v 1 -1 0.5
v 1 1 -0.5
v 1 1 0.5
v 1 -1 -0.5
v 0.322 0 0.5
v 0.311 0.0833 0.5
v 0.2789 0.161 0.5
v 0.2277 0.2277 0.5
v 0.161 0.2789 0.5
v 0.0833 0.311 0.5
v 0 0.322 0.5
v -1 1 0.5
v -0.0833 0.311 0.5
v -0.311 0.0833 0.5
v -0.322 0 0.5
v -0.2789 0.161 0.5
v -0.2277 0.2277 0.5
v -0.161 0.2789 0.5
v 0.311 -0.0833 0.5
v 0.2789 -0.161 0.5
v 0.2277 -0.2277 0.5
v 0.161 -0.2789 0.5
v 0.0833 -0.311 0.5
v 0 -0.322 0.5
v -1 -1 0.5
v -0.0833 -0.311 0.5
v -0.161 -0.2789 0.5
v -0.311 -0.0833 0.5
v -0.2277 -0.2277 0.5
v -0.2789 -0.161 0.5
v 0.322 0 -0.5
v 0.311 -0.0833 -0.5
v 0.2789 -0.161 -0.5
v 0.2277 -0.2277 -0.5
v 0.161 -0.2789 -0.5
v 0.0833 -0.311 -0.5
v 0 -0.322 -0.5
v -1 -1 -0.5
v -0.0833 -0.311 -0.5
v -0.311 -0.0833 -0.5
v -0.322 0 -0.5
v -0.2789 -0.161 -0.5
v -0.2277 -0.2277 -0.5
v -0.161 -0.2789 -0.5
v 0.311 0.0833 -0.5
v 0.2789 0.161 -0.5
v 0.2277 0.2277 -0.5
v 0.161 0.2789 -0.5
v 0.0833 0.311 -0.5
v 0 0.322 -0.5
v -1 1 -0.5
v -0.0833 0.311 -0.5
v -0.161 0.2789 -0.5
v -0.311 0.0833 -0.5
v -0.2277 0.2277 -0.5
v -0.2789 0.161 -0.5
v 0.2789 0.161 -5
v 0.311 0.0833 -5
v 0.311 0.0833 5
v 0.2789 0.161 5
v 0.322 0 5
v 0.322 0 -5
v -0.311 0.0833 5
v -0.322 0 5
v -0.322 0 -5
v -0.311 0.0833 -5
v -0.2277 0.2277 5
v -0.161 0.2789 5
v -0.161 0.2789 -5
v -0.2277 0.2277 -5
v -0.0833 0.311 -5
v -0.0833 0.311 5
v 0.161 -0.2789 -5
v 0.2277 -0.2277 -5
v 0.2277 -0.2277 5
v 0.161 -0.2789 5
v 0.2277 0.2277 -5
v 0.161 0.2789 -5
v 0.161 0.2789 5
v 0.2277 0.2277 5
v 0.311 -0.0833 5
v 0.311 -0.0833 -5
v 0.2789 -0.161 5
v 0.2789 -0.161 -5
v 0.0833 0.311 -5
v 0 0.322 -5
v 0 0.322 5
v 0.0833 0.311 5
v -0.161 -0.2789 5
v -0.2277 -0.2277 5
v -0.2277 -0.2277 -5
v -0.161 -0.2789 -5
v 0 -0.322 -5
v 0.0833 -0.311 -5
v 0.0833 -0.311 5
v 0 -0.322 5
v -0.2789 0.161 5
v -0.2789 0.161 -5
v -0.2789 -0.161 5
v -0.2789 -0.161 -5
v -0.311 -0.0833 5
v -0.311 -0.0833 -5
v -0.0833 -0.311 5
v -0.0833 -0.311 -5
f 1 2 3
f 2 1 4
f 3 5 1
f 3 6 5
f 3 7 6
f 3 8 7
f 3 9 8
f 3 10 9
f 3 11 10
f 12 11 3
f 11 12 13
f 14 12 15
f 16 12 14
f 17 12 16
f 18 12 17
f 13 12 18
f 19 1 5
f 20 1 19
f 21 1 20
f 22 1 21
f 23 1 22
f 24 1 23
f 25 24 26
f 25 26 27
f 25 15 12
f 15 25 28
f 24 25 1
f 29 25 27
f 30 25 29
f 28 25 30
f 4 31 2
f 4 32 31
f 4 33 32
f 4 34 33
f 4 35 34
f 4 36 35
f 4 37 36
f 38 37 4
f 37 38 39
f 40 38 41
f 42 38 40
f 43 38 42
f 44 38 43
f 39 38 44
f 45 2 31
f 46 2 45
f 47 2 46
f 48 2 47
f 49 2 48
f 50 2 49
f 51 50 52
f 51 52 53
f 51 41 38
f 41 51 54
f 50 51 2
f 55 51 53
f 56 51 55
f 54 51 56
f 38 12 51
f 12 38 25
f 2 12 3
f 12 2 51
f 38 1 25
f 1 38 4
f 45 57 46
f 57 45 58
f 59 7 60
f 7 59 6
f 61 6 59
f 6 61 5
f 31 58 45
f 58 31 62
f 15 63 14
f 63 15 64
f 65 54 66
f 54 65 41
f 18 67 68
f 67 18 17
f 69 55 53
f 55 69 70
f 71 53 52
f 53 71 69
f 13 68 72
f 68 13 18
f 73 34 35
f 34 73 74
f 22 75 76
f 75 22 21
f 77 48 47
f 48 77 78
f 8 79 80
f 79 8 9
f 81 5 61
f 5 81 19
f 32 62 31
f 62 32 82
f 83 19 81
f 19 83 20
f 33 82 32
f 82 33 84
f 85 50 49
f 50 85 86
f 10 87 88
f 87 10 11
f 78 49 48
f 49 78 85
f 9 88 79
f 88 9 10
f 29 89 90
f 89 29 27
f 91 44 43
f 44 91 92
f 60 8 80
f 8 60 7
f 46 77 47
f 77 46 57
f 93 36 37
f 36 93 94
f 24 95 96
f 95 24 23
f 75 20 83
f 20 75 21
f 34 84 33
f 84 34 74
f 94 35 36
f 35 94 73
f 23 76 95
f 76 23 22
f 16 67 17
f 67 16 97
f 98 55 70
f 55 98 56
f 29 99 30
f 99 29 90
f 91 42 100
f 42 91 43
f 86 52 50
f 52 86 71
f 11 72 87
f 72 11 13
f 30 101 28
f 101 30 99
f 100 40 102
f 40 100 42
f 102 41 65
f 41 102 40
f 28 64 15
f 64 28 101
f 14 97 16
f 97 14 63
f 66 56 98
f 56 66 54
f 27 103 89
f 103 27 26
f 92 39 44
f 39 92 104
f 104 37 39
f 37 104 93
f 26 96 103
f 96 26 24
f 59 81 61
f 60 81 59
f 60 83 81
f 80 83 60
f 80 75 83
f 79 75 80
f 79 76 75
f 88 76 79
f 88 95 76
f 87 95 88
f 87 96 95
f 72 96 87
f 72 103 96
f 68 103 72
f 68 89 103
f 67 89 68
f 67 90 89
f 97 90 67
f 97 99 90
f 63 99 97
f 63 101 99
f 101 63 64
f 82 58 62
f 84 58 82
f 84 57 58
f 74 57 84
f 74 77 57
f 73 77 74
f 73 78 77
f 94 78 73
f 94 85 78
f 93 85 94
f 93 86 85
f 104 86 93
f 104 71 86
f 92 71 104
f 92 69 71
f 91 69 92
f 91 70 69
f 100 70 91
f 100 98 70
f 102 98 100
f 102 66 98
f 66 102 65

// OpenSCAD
wire_diameter = 0.644;
pixel=1.0;
$fn=24;

difference() {
	cube([pixel*2,pixel*2,pixel],center=true);
	cylinder(r=wire_diameter/2,h=pixel,center=true);
}

rotate([0,0,45])
	cylinder(r=wire_diameter/2,h=10,center=true);
